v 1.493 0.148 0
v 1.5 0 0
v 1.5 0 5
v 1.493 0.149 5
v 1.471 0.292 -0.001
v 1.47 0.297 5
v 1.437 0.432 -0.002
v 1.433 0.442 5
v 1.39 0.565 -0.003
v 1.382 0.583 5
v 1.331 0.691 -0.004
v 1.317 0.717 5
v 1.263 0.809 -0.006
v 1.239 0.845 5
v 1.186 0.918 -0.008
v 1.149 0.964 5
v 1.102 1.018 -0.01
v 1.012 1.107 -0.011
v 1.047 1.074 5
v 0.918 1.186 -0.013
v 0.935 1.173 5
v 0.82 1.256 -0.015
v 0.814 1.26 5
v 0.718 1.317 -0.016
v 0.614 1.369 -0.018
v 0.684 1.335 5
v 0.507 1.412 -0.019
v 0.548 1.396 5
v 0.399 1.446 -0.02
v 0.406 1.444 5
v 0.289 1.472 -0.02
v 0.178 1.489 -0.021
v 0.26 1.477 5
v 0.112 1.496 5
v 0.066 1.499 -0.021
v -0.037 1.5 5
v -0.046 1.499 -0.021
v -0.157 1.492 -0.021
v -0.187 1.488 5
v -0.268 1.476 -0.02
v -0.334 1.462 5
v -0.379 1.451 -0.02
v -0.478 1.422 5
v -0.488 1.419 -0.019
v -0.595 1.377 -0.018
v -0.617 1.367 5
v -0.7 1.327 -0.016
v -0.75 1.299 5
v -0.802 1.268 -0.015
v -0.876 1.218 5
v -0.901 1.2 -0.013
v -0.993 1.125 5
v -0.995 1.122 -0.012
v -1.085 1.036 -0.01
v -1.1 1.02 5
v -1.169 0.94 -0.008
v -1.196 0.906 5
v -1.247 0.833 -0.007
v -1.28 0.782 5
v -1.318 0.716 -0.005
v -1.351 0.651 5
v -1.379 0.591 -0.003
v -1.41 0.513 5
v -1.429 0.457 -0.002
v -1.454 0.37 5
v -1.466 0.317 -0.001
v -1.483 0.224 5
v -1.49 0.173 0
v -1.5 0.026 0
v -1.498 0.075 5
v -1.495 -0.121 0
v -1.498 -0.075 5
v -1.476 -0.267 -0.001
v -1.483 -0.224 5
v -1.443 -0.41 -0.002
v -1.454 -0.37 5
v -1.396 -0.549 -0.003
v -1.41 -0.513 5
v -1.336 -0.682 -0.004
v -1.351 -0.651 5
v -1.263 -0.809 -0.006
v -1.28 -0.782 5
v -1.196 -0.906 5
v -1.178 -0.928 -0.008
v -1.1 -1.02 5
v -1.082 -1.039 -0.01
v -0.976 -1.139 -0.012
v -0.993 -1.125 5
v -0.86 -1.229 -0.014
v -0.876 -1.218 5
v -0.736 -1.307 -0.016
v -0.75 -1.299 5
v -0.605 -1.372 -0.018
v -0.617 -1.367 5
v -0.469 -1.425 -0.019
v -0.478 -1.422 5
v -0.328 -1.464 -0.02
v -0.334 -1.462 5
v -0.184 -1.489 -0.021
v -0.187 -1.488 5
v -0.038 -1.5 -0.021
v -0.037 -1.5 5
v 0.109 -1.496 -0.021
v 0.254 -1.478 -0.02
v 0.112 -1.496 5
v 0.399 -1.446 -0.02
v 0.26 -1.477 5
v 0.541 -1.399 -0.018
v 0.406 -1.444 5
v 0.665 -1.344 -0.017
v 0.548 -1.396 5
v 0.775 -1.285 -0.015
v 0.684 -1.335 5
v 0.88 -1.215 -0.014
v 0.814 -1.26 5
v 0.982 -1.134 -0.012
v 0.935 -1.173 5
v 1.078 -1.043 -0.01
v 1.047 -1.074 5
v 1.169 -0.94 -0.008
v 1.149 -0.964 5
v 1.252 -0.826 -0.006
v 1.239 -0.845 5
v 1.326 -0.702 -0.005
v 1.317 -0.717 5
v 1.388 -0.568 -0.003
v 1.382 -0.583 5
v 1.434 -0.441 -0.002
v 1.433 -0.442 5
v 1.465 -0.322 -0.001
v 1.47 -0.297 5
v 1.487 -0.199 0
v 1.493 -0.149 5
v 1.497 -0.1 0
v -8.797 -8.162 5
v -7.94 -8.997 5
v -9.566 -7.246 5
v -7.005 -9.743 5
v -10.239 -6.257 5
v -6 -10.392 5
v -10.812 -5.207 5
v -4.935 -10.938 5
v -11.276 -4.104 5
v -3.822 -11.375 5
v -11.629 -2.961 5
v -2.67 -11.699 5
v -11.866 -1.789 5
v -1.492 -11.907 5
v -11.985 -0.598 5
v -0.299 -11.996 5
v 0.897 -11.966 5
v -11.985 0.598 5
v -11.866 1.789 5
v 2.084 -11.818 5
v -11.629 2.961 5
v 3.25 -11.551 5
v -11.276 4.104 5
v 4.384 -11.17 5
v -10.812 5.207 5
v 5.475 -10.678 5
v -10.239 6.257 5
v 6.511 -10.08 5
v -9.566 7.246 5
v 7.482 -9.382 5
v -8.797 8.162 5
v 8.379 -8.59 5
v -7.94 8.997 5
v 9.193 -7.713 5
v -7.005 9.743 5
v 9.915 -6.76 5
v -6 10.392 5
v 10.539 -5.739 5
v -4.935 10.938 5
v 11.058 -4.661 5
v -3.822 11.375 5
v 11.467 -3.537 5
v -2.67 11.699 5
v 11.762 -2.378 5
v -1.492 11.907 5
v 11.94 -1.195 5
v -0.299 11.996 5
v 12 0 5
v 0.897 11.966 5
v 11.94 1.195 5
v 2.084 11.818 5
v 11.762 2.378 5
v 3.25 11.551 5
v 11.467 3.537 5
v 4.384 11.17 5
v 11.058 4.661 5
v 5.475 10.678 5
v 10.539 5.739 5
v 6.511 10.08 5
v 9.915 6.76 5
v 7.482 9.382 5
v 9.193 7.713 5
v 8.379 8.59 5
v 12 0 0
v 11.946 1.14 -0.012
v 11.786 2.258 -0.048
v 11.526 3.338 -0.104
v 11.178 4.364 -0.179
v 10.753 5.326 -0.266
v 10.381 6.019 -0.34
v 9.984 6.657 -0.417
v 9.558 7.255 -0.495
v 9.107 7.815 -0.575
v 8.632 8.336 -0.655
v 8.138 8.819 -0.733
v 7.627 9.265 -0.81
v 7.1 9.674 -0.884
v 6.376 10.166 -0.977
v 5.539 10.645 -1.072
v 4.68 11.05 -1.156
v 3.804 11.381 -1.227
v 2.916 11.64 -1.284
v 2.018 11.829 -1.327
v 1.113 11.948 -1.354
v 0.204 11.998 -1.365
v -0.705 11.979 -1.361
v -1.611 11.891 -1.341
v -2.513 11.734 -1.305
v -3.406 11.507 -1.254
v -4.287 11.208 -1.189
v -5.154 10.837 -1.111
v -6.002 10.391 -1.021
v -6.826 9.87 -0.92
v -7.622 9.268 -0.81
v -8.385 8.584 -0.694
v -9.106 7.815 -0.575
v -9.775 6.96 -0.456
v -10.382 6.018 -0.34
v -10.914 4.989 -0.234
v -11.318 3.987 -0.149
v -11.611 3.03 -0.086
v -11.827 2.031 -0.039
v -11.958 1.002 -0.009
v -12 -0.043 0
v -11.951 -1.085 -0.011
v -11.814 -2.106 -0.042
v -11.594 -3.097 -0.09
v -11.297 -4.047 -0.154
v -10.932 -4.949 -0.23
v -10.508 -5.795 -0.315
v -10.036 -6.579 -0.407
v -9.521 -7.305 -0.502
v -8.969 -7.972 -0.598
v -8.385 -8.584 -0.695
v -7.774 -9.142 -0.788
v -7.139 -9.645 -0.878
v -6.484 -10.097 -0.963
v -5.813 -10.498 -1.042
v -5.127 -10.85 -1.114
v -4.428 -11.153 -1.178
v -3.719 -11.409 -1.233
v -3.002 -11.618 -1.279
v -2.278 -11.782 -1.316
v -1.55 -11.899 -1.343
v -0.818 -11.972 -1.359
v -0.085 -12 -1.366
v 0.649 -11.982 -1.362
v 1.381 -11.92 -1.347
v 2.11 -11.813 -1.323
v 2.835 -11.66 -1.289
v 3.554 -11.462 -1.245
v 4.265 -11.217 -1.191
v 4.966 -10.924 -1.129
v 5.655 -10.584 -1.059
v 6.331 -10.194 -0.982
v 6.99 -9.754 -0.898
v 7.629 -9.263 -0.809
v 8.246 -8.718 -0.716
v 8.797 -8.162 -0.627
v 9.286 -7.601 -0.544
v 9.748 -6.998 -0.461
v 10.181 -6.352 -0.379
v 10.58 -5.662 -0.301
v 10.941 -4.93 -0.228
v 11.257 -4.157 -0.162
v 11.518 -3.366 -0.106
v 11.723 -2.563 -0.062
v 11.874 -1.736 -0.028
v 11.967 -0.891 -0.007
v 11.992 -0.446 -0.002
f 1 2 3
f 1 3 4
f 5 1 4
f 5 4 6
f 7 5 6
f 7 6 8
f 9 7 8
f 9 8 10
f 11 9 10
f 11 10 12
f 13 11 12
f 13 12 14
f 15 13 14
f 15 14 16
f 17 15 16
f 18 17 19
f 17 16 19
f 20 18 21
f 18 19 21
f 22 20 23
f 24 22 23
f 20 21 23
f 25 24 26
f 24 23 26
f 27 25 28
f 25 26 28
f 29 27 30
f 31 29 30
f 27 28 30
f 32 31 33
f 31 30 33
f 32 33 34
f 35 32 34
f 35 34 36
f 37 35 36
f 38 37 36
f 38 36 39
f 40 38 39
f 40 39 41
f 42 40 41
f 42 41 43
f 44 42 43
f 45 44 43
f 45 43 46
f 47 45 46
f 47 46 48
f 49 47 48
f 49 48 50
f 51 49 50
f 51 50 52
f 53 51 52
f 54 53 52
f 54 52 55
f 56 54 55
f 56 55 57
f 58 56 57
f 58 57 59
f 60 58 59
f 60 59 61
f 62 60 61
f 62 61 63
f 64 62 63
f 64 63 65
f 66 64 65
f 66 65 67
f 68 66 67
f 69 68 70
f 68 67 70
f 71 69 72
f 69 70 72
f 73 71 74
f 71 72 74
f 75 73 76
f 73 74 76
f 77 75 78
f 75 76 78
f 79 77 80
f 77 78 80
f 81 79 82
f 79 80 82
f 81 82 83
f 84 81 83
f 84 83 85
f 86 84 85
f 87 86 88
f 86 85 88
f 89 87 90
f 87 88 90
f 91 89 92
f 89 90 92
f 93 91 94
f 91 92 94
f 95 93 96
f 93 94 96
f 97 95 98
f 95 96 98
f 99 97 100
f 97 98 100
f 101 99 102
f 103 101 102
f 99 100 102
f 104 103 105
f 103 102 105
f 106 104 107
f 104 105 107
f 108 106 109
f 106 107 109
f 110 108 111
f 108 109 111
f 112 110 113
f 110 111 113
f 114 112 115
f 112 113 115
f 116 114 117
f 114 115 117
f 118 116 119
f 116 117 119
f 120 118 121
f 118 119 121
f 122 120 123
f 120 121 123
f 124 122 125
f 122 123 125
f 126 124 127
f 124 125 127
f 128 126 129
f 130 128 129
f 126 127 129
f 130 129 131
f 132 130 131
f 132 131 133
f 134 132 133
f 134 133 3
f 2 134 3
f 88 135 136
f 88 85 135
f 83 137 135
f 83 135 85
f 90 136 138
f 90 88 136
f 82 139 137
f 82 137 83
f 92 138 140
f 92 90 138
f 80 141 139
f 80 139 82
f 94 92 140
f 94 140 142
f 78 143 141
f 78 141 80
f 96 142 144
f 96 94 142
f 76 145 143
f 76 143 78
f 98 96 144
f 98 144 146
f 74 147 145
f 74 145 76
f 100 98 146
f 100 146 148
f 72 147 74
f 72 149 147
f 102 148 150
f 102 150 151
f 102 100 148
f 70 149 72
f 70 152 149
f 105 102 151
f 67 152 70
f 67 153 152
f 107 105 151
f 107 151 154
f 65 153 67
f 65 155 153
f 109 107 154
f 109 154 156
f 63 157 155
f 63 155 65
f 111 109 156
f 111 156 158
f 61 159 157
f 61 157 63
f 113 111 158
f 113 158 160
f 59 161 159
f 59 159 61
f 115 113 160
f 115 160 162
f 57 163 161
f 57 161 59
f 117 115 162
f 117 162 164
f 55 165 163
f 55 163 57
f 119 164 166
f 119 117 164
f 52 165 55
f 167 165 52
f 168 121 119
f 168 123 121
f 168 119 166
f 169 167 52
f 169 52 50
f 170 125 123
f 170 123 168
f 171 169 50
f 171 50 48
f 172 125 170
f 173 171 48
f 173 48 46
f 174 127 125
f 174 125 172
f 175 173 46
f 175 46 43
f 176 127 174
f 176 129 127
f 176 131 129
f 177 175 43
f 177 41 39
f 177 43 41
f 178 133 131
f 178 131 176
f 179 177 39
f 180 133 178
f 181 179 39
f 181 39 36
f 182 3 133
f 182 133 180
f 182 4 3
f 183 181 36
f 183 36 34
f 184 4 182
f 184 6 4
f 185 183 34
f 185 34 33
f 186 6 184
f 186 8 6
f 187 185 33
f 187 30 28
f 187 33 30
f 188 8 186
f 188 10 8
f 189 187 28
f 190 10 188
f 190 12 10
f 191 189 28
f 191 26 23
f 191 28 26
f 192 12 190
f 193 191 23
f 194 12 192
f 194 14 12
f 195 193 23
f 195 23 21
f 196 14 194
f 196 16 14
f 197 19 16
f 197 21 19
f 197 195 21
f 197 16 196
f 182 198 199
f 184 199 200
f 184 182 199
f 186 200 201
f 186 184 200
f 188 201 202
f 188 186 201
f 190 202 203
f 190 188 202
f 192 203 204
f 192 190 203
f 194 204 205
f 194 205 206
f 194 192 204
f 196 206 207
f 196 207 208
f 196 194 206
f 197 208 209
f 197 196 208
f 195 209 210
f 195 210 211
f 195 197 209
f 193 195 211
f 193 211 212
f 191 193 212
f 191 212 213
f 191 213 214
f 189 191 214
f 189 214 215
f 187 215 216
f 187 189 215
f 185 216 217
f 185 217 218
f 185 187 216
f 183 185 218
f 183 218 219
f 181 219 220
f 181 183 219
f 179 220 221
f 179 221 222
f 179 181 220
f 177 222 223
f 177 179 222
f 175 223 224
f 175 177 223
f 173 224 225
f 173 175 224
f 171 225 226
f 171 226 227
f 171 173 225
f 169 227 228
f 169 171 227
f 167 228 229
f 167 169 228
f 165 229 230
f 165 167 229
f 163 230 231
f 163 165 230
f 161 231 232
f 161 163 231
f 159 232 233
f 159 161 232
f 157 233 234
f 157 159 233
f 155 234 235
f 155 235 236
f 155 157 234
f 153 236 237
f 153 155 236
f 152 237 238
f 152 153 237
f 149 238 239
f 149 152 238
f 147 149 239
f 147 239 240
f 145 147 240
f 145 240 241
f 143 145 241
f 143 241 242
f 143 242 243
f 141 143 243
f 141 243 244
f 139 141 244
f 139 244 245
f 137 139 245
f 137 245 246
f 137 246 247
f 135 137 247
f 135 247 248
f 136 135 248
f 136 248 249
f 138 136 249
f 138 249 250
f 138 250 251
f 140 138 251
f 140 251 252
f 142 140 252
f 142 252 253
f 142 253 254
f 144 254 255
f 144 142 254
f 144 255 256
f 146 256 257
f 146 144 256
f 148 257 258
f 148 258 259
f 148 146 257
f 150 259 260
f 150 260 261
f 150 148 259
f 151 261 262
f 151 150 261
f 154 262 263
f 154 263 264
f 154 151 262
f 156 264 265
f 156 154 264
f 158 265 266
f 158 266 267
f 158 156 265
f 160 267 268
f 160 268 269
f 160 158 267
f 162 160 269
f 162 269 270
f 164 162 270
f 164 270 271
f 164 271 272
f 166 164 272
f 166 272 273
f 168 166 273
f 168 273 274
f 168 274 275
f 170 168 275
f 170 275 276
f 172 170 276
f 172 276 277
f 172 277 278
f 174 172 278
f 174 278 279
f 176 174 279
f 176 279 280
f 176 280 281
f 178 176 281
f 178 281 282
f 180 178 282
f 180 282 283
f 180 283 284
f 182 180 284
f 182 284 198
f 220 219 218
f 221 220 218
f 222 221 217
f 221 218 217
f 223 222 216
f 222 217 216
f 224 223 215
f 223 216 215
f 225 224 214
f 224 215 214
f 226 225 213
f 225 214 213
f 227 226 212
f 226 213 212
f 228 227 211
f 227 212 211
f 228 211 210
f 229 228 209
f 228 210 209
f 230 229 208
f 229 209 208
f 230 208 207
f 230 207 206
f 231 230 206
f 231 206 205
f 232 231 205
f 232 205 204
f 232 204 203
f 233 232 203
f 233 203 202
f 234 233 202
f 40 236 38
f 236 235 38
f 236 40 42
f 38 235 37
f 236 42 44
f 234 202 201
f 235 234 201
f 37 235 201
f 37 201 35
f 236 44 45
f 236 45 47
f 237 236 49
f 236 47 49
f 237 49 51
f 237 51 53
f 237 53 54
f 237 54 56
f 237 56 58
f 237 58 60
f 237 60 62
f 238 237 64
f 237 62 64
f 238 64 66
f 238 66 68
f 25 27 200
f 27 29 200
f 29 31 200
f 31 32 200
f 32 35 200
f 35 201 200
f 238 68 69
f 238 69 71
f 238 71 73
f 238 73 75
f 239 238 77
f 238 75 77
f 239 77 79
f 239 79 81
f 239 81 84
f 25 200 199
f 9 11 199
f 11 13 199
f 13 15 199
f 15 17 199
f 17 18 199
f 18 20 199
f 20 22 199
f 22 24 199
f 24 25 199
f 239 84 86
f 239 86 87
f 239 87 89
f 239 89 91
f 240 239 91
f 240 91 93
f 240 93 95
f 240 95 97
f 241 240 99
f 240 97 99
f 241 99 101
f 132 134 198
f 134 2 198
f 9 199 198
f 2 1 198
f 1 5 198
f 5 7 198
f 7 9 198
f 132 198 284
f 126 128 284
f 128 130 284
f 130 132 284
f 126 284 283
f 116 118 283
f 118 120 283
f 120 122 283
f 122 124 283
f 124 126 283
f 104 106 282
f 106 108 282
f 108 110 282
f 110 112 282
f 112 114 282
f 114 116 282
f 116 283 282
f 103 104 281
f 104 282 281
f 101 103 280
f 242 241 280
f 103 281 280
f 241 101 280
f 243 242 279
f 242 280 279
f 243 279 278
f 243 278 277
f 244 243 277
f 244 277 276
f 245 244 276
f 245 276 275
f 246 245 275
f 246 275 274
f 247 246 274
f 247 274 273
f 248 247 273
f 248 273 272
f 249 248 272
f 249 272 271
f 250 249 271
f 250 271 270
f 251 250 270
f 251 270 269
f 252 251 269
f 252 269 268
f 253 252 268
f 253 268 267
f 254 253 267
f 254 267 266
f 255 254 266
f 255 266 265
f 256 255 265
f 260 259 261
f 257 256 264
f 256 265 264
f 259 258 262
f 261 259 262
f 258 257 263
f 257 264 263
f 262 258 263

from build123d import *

# Parameters (mm, degrees)
F0_R     = 12
F1_DEPTH = 5
F2_R     = 53.4
F3_DEPTH = 12.5
F4_R     = 1.5
F5_DEPTH = 6.366781


with BuildPart() as f1:
    # F0 (on Top) → F1 (new body, symmetric)
    with BuildSketch(Plane.XY):
        Circle(F0_R)
    extrude(amount=F1_DEPTH, both=True)

    # F2 (on Right) → F3 (cut, symmetric)
    with BuildSketch(Plane.YZ):
        with Locations((0, -53.4)):
            Circle(F2_R)
    extrude(amount=F3_DEPTH, both=True, mode=Mode.SUBTRACT)

    # F4 (on face) → F5 (cut, through all)
    with BuildSketch(Plane.XY.offset(5)):
        Circle(F4_R)
    extrude(amount=-F5_DEPTH, mode=Mode.SUBTRACT)


solid = f1.part
